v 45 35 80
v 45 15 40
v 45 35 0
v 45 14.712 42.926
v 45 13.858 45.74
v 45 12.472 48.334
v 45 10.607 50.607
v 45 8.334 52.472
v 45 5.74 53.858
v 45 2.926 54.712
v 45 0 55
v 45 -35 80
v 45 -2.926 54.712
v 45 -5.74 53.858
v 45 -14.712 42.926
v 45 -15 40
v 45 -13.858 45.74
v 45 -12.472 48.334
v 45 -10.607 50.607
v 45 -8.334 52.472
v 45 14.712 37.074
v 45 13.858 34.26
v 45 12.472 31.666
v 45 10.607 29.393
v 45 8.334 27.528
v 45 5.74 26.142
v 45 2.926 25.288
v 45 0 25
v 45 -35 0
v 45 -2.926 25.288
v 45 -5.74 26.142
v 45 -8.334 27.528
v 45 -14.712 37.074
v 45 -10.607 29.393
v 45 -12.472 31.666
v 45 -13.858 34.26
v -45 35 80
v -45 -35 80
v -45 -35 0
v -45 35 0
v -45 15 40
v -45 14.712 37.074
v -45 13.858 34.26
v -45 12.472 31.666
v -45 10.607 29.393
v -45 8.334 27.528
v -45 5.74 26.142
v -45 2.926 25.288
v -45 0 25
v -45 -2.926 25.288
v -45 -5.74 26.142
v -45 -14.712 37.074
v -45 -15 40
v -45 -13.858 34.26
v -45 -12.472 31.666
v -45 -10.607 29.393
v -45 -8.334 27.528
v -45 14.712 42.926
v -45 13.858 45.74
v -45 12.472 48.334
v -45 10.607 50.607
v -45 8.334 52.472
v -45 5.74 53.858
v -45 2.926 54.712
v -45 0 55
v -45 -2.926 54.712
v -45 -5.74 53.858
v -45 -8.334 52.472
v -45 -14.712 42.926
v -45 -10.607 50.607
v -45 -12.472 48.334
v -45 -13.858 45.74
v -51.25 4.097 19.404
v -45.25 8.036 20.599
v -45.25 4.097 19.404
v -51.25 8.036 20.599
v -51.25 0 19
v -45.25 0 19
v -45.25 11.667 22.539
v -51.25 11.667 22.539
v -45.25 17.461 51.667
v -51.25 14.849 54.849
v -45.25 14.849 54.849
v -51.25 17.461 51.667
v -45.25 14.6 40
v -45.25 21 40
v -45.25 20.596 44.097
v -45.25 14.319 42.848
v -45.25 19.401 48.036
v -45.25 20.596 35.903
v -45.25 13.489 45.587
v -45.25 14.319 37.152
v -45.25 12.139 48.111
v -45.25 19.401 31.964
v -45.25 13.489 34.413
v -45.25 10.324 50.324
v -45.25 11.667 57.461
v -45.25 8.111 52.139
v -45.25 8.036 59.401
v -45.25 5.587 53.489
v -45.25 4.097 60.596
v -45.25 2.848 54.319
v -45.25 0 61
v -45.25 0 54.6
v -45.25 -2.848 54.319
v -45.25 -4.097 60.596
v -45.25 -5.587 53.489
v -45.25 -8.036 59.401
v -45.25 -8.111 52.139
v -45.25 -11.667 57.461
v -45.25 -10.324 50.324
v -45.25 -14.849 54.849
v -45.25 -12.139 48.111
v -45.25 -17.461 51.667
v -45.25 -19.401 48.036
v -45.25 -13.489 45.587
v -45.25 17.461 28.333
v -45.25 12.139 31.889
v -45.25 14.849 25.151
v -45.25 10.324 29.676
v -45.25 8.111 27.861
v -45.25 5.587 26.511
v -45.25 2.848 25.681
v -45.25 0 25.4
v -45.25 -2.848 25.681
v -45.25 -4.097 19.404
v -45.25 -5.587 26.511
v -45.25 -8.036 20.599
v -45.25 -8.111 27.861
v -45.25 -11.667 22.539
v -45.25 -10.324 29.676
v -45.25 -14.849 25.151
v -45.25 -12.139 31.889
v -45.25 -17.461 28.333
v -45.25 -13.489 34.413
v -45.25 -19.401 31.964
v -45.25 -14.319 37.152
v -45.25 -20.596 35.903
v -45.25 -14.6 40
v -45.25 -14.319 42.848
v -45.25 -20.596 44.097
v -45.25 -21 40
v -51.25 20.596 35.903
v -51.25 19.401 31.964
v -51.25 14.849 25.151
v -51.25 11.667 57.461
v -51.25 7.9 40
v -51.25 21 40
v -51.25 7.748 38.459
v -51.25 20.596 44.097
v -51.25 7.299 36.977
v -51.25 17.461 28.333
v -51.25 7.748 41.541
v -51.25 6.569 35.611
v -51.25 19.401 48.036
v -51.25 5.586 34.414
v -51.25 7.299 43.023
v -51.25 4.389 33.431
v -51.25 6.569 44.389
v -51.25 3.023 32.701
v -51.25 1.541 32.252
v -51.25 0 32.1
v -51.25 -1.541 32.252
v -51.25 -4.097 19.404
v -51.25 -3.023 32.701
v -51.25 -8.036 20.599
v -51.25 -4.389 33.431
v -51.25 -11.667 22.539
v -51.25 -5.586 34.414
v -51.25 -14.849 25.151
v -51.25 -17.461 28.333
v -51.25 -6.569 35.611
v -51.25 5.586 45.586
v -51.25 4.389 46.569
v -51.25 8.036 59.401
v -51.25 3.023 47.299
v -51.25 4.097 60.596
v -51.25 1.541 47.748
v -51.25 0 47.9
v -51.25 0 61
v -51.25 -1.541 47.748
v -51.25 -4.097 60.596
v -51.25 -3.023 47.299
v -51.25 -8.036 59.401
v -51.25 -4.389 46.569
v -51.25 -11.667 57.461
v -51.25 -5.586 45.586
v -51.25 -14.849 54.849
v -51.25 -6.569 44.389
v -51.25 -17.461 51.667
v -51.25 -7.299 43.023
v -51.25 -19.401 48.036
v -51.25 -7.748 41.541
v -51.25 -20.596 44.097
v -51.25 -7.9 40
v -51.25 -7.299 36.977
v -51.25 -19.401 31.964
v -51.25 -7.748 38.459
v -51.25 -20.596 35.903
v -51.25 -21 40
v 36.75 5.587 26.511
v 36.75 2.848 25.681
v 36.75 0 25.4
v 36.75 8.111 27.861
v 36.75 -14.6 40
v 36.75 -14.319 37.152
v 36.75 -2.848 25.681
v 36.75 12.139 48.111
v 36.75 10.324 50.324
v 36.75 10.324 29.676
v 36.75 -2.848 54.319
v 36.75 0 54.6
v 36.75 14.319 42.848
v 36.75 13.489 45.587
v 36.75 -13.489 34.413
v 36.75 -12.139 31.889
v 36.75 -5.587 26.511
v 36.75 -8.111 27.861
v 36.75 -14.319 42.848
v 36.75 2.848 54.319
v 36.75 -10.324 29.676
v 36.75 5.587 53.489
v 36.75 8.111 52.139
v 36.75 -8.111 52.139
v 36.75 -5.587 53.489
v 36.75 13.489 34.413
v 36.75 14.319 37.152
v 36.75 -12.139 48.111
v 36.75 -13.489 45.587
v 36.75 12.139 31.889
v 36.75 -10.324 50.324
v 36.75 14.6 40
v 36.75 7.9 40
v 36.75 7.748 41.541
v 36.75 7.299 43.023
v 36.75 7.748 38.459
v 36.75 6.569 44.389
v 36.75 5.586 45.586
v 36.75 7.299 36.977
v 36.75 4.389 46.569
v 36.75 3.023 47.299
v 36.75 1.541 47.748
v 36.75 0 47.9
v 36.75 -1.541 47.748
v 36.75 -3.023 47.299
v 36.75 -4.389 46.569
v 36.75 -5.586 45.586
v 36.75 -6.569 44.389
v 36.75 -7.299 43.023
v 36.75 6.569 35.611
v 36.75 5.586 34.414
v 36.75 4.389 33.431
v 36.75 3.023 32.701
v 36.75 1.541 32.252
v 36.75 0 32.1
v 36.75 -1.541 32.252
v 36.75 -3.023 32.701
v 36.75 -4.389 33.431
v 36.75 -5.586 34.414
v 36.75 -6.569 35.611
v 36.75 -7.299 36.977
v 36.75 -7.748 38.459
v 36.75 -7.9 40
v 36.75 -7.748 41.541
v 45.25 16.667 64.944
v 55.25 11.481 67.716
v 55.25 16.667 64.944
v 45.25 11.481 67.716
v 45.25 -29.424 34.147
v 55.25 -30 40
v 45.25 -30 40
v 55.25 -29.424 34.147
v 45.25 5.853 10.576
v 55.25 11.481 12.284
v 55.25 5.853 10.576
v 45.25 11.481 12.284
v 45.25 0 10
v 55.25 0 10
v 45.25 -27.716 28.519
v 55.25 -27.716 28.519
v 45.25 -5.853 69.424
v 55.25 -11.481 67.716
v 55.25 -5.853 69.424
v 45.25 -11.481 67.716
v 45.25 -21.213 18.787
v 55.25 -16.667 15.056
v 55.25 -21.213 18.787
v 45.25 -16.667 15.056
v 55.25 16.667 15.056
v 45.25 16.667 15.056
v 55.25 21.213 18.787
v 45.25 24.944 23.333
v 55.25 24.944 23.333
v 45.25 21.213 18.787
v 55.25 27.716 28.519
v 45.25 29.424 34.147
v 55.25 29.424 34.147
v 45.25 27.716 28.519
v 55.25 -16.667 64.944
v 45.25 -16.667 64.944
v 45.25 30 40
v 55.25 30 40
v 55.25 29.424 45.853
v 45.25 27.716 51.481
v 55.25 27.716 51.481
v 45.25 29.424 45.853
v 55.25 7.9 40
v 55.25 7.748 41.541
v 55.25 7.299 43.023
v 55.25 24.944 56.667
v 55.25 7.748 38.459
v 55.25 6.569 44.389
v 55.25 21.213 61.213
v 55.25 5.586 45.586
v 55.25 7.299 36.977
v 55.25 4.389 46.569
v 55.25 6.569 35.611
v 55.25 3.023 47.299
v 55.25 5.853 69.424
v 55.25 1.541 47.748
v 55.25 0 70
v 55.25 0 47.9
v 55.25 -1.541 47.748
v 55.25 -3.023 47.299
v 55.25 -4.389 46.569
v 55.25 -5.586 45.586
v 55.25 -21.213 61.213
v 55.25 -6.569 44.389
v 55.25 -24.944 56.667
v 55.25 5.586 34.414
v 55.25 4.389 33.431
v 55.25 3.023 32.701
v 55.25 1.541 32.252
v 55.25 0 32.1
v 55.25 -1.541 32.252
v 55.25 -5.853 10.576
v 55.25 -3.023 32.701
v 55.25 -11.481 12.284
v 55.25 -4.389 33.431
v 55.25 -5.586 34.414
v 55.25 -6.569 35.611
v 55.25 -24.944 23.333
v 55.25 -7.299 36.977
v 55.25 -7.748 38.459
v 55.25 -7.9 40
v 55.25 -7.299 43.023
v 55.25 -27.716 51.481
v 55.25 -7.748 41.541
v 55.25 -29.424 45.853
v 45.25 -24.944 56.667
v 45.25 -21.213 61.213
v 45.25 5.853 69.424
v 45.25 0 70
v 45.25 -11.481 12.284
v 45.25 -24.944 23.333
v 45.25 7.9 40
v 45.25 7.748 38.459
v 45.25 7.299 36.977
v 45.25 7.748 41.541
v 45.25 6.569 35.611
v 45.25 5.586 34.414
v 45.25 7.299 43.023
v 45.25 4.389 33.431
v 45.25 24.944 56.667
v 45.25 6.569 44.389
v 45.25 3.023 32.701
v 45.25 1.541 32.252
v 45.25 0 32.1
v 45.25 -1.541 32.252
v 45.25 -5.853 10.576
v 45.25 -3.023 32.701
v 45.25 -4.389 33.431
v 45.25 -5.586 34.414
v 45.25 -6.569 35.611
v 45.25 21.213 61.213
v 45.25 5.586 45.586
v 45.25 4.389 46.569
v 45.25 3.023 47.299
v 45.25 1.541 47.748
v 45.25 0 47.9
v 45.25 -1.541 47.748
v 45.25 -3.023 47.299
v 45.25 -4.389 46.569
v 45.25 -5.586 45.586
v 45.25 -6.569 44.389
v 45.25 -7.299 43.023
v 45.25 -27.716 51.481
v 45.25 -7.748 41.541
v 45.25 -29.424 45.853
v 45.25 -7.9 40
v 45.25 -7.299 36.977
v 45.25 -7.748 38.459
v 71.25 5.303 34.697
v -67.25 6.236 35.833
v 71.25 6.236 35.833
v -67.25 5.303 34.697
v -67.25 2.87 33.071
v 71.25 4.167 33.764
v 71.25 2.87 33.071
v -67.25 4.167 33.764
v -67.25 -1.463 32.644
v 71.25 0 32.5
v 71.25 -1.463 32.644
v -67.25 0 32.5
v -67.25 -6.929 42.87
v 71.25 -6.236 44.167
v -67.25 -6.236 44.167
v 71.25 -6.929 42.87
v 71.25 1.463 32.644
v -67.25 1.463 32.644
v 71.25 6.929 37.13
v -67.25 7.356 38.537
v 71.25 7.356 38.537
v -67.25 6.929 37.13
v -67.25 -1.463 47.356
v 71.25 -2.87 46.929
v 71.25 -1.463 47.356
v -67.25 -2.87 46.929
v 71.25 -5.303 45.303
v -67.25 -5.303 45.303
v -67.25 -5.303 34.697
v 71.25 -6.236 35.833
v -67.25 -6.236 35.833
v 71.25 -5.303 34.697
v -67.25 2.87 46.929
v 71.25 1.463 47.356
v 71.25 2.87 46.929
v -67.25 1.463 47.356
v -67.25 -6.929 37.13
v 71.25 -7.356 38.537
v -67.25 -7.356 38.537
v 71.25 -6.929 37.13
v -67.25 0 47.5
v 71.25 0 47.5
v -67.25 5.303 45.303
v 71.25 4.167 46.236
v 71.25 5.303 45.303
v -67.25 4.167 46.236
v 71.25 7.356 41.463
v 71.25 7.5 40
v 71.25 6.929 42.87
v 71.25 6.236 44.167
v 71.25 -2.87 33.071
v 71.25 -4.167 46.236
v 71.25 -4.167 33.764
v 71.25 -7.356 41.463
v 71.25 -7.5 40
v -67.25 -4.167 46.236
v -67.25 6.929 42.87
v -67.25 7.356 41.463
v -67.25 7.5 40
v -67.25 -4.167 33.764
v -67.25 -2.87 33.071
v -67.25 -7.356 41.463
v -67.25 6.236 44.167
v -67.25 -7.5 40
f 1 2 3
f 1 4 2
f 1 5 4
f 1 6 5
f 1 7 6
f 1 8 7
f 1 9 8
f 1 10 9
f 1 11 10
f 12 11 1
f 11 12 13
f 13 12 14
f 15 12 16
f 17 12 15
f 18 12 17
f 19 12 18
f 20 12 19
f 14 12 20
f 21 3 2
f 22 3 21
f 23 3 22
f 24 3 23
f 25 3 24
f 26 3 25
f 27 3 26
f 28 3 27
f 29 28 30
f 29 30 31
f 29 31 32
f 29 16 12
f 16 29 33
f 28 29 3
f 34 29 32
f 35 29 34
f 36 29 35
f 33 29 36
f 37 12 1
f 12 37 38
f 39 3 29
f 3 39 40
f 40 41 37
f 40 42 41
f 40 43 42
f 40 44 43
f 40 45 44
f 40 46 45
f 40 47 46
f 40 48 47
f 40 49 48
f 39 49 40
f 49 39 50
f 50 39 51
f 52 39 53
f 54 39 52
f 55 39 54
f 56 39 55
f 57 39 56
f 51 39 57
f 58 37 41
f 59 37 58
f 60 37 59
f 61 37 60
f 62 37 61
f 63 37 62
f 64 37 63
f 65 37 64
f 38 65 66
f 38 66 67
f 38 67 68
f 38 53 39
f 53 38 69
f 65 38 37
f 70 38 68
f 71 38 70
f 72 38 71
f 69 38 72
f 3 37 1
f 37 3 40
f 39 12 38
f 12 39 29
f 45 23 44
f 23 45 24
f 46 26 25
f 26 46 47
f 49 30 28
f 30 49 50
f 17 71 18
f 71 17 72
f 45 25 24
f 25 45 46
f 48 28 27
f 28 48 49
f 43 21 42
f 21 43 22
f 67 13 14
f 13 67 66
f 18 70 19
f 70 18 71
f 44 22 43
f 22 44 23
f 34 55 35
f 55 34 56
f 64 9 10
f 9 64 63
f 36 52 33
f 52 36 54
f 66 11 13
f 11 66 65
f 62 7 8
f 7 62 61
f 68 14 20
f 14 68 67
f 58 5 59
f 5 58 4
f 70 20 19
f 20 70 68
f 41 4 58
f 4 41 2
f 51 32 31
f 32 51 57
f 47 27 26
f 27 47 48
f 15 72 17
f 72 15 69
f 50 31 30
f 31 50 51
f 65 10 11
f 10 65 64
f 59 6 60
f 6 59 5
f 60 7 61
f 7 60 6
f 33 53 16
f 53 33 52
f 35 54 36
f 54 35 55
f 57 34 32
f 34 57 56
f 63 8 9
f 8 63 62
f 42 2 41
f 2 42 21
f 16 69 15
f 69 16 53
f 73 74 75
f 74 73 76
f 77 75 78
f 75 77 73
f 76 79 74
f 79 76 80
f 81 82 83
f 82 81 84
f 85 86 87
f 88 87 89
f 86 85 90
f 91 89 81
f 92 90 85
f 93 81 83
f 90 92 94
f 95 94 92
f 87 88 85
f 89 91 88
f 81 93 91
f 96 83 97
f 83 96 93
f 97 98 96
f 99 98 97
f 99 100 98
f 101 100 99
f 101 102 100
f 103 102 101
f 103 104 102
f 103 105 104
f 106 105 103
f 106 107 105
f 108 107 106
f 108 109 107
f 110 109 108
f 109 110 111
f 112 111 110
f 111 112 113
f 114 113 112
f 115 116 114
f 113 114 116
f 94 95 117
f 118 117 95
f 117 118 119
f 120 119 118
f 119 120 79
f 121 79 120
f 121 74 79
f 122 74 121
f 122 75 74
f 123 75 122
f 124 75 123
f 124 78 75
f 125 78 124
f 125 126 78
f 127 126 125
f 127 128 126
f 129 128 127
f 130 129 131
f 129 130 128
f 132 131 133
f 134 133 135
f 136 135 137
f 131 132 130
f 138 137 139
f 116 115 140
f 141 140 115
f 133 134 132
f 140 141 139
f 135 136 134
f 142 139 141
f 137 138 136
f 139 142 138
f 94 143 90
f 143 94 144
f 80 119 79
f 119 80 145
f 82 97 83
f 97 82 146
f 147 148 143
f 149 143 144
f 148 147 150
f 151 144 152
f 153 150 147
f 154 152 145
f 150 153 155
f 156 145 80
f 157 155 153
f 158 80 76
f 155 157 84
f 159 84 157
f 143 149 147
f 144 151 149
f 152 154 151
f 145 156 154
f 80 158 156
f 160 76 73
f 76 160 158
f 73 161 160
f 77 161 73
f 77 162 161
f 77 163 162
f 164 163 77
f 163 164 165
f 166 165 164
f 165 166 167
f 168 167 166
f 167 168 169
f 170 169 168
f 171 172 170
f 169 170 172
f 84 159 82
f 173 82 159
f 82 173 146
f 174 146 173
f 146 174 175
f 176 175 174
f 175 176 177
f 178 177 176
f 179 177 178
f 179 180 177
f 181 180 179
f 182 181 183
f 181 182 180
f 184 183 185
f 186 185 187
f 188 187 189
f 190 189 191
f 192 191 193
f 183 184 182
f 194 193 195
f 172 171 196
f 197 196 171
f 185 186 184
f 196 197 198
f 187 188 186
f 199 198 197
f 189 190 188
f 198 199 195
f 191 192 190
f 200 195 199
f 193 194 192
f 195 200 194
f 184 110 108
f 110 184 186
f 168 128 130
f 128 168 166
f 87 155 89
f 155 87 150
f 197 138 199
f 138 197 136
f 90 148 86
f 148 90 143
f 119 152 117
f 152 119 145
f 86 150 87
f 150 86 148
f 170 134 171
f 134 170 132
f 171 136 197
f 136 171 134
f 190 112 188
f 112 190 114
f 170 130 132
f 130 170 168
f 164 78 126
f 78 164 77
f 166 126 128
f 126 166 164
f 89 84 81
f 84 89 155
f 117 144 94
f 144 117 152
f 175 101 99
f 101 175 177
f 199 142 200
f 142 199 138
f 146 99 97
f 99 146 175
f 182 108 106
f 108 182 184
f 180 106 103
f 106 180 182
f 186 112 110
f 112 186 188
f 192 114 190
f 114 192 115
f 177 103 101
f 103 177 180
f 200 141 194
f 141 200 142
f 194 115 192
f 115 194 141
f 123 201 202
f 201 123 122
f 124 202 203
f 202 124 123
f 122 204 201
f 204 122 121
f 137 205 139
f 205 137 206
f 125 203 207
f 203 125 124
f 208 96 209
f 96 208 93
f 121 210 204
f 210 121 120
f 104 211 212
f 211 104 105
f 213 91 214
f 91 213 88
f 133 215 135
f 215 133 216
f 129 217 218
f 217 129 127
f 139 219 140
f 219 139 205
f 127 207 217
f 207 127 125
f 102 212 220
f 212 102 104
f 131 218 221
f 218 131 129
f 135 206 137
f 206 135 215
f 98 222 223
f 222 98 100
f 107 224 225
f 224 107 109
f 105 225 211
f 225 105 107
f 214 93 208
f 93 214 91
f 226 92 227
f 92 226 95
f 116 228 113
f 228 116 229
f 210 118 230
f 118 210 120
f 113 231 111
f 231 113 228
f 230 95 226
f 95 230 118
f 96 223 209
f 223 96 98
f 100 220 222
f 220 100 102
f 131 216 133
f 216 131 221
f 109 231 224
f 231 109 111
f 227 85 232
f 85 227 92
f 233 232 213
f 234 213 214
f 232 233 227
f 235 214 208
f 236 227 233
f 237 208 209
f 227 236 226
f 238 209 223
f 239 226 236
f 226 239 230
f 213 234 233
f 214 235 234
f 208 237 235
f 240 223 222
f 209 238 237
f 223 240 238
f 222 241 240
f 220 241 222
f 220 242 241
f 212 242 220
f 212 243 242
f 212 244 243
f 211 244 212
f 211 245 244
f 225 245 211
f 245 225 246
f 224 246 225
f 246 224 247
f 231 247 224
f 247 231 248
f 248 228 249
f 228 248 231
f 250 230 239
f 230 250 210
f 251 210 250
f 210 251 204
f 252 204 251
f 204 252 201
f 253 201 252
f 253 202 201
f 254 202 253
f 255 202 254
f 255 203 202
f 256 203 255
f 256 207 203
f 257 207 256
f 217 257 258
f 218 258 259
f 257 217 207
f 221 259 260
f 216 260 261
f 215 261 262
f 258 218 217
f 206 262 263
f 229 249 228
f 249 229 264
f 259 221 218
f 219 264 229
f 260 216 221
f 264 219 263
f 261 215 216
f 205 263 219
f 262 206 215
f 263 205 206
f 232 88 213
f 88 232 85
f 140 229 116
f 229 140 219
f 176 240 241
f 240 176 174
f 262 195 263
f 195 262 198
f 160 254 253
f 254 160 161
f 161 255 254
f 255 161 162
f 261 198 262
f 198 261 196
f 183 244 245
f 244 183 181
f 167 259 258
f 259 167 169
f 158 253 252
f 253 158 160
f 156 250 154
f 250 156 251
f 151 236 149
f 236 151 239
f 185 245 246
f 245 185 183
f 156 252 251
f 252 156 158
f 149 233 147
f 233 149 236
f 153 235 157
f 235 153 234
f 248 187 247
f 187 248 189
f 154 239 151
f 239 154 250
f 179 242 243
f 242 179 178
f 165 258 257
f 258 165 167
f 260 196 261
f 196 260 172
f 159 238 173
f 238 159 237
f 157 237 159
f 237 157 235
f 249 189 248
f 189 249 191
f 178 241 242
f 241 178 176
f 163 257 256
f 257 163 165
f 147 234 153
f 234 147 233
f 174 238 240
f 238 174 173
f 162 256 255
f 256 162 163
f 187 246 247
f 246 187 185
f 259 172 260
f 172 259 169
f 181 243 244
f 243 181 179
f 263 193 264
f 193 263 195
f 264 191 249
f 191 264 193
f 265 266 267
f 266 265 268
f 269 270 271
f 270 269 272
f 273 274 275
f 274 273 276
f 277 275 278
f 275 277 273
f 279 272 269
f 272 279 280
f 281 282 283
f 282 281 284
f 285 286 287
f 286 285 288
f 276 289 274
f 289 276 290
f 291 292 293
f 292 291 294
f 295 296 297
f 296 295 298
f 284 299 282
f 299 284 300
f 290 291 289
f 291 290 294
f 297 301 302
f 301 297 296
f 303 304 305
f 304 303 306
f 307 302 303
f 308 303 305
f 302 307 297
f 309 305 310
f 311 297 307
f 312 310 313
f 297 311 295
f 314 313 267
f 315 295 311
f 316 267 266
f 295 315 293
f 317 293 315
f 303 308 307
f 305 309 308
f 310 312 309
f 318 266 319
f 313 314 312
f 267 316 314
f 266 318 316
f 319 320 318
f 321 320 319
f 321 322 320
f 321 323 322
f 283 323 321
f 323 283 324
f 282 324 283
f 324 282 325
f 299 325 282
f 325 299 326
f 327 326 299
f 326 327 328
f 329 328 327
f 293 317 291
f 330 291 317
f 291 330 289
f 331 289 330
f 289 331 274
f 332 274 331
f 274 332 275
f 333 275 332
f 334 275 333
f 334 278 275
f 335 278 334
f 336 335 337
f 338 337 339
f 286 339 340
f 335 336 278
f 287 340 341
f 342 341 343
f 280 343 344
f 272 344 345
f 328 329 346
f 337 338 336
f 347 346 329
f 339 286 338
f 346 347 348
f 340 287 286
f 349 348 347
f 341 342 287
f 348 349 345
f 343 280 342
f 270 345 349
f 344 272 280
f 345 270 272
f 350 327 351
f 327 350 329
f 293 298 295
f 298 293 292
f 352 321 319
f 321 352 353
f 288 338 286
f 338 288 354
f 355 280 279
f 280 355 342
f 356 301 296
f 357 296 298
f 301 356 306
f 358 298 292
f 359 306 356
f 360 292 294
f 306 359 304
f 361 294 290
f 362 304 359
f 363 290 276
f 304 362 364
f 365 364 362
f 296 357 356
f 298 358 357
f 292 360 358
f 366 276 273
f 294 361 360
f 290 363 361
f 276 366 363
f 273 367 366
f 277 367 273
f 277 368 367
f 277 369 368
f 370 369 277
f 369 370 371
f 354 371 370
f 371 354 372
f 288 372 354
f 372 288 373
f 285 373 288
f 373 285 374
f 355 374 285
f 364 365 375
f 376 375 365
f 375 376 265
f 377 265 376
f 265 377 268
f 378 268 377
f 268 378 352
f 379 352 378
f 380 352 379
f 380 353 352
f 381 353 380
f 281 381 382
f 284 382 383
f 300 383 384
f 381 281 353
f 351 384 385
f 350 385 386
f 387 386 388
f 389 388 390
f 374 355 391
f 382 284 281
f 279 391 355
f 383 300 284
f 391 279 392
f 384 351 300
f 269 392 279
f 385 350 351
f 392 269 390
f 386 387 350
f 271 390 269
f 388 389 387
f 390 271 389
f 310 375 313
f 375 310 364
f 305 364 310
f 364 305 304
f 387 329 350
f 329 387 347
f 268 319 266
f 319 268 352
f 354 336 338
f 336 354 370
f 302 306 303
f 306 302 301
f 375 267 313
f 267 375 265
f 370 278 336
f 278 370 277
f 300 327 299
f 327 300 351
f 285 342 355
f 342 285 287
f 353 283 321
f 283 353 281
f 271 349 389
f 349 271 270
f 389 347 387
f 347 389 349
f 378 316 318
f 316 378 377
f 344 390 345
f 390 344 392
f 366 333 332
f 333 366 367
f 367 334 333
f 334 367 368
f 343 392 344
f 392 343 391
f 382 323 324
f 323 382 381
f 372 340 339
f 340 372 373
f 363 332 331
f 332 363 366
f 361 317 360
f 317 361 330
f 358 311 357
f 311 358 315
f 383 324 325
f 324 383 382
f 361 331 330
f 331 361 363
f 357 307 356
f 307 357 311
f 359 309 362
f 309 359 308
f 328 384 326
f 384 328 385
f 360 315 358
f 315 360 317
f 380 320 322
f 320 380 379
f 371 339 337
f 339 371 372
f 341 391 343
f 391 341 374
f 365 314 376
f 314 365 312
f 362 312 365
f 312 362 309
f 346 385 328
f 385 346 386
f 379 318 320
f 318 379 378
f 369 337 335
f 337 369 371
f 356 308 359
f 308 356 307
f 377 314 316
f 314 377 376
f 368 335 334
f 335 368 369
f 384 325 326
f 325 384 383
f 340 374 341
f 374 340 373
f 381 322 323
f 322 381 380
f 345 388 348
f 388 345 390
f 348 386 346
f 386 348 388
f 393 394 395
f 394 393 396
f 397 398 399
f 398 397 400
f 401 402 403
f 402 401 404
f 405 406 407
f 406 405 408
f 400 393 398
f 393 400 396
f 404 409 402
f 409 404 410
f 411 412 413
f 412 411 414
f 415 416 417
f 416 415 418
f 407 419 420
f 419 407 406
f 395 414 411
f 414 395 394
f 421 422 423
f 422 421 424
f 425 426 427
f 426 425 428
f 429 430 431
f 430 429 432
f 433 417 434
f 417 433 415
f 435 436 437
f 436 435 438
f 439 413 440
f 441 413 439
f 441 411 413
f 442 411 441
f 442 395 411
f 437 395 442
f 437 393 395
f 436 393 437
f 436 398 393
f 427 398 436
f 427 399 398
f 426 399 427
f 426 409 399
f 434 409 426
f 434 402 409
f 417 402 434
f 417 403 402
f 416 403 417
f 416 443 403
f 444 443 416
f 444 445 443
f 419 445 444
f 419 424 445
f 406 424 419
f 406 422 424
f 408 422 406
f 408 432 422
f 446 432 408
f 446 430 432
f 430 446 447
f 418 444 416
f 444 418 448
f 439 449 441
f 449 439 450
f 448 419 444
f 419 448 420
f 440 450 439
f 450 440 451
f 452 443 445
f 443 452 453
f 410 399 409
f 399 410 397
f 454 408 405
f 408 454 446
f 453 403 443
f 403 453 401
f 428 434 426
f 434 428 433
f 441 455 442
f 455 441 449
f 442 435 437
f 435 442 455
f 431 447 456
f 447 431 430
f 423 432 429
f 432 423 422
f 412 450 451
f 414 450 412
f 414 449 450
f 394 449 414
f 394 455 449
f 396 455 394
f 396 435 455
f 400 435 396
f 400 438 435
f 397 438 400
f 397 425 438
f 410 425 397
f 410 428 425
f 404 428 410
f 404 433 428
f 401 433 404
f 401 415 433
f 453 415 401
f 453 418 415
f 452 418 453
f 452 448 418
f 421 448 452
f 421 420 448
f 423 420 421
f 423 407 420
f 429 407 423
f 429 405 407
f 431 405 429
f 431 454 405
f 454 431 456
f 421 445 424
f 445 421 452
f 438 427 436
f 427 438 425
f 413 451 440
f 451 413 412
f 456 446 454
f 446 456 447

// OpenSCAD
$fn = 32;

// ------------------------------------------------------------------------
// Bushed housing: 90 x 70 x 80 mm housing, bushing d29.2
// Every part is its own module, assembly() places them once.
// ------------------------------------------------------------------------

// --- part 1 ---
module housing() {
  difference() {
    translate([-45, -35, 0]) cube([90, 70, 80]);
    translate([0, 0, 40]) rotate([0, 90, 0]) cylinder(h = 92, d = 30, center = true);
  }
}

// --- part 2 ---
module bushing() {
  difference() {
    union() {
      cylinder(h = 6, d = 42);
      translate([0, 0, 6]) cylinder(h = 82, d = 29.2);
    }
    translate([0, 0, -1]) cylinder(h = 90, d = 15.8);
  }
}

// --- part 3 ---
module shaft() {
  translate([0, 0, -69.25]) cylinder(h = 138.5, d = 15);
}

// --- part 4 ---
module cover() {
  difference() {
    cylinder(h = 10, d = 60);
    translate([0, 0, -1]) cylinder(h = 12, d = 15.8);
  }
}

// --- assembly ---
module assembly() {
  translate([0, 0, 0]) rotate([0, 0, 0]) housing();
  translate([-51.25, 0, 40]) rotate([0, 90, 0]) bushing();
  translate([2, 0, 40]) rotate([0, 90, 0]) shaft();
  translate([45.25, 0, 40]) rotate([0, 90, 0]) cover();
}

assembly();
